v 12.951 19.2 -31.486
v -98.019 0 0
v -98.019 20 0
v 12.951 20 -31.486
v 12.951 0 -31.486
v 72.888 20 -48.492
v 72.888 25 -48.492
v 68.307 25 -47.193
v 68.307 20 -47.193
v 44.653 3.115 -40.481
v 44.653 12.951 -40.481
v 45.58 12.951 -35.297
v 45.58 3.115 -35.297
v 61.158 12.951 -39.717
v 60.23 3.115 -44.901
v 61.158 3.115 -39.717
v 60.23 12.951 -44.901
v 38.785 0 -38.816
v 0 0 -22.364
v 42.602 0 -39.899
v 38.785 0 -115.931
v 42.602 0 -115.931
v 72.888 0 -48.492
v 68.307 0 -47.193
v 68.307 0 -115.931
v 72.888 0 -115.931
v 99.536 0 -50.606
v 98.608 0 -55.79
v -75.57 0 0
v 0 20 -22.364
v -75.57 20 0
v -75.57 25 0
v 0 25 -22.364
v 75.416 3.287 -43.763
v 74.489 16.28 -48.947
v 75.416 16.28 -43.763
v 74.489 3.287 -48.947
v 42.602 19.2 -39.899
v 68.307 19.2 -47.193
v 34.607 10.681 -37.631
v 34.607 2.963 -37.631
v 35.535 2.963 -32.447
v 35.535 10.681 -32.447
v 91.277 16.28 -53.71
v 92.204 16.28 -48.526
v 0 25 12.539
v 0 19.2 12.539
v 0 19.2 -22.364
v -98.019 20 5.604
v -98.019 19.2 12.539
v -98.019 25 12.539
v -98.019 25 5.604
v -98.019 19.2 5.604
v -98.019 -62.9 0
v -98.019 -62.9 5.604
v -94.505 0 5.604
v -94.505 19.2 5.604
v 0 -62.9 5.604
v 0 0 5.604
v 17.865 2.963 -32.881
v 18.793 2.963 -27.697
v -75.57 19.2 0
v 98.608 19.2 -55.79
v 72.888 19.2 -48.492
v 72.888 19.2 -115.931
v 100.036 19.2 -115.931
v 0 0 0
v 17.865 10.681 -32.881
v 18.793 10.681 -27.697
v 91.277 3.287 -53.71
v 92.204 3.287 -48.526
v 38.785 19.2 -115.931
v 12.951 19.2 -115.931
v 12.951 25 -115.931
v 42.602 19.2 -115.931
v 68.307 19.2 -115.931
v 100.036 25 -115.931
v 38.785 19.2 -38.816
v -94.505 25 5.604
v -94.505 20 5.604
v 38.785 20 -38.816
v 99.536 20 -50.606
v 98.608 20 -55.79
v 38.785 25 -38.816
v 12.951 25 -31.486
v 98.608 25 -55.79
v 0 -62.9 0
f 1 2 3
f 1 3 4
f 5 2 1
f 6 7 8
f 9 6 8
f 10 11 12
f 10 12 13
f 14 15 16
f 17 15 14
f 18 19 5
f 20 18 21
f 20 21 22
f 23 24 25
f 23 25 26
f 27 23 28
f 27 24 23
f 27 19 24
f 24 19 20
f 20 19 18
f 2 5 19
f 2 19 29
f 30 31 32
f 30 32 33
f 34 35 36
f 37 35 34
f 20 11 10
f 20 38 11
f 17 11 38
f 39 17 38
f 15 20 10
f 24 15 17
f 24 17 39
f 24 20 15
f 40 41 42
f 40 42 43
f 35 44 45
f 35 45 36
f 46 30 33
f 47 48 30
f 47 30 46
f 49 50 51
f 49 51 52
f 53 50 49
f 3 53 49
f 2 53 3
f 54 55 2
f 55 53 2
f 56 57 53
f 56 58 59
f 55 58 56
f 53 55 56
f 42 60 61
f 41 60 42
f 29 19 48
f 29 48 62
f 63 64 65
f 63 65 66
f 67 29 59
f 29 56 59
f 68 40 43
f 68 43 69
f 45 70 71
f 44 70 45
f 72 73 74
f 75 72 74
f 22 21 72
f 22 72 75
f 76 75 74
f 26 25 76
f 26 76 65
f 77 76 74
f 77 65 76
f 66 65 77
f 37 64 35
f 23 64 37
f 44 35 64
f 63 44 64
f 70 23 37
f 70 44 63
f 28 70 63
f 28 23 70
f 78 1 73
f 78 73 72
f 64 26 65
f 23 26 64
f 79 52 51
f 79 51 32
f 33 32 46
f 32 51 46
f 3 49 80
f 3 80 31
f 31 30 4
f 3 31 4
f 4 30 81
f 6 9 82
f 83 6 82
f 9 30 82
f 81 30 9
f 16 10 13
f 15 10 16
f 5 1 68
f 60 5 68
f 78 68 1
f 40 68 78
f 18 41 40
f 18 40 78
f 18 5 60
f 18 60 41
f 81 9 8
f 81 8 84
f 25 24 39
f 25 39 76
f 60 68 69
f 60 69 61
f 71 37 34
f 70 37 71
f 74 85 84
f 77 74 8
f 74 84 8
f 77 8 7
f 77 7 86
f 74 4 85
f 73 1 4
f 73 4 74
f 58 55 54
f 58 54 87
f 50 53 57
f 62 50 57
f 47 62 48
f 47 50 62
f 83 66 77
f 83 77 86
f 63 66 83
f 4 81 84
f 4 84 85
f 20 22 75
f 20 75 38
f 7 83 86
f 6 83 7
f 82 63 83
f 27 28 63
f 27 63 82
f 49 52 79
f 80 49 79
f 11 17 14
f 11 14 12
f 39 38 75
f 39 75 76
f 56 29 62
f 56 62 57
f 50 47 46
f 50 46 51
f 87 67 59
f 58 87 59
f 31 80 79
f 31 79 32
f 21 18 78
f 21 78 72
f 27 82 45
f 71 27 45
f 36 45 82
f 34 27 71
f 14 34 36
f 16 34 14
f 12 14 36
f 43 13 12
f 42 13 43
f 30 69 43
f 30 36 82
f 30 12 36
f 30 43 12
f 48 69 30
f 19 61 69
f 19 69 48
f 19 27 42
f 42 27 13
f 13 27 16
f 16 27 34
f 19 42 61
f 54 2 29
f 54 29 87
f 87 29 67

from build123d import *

# Parameters (mm, degrees)
F1_DEPTH = 62.9
F2_DEPTH = 20
F3_START = -19.2
F3_DEPTH = 5.8
F4_W     = 17.40286313
F4_H     = 7.7177907806
F4_W_2   = 16.192227602
F4_H_2   = 9.8363999277
F4_W_3   = 17.4506753683
F4_H_3   = 12.9930109251


with BuildPart() as f1:
    # F0 (on Front) → F1 (new body)
    with BuildSketch(Plane.XZ):
        Polygon((-75.5699121067, 0), (0, 0), (0, 5.6038224138), (-94.5054218173, 5.6038224138), align=None)
        Polygon((-98.0191975832, 0), (-75.5699121067, 0), (-94.5054218173, 5.6038224138), (-98.0191975832, 5.6038224138), align=None)
    extrude(amount=F1_DEPTH)

    # F0 (on Front) → F2 (join)
    with BuildSketch(Plane.XZ):
        Polygon((0, -22.3643500358), (-75.5699121067, 0), (-98.0191975832, 0), (12.9512035679, -31.4862316811), (38.7845113873, -38.8160557302), (42.6020771265, -39.8992342902), (68.3070272207, -47.1926387081), (72.8881061077, -48.4924529801), (98.6080013494, -55.7900978655), (99.5356142521, -50.6061278284), align=None)
        Polygon((-98.0191975832, 0), (-75.5699121067, 0), (-94.5054218173, 5.6038224138), (-98.0191975832, 5.6038224138), align=None)
        Polygon((72.8881061077, -115.9313321114), (72.8881061077, -48.4924529801), (68.3070272207, -47.1926387081), (68.3070272207, -115.9313321114), align=None)
        Polygon((42.6020771265, -39.8992342902), (38.7845113873, -38.8160557302), (38.7845113873, -115.9313321114), (42.6020771265, -115.9313321114), align=None)
    extrude(amount=-F2_DEPTH)

    # F0 (on Front) → F3 (join)
    with BuildSketch(Plane.XZ.offset(F3_START)):
        Polygon((0, -22.3643500358), (0, 0), (-75.5699121067, 0), align=None)
        Polygon((-75.5699121067, 0), (0, 0), (0, 5.6038224138), (-94.5054218173, 5.6038224138), align=None)
        Polygon((-94.5054218173, 5.6038224138), (0, 5.6038224138), (0, 12.5394500792), (-98.0191975832, 12.5394500792), (-98.0191975832, 5.6038224138), align=None)
        Polygon((38.7845113873, -38.8160557302), (12.9512035679, -31.4862316811), (12.9512035679, -115.9313321114), (38.7845113873, -115.9313321114), align=None)
        Polygon((68.3070272207, -47.1926387081), (42.6020771265, -39.8992342902), (42.6020771265, -115.9313321114), (68.3070272207, -115.9313321114), align=None)
        Polygon((100.0360324979, -115.9313321114), (98.6080013494, -55.7900978655), (72.8881061077, -48.4924529801), (72.8881061077, -115.9313321114), align=None)
        Polygon((42.6020771265, -39.8992342902), (38.7845113873, -38.8160557302), (38.7845113873, -115.9313321114), (42.6020771265, -115.9313321114), align=None)
        Polygon((72.8881061077, -115.9313321114), (72.8881061077, -48.4924529801), (68.3070272207, -47.1926387081), (68.3070272207, -115.9313321114), align=None)
    extrude(amount=-F3_DEPTH)

    # F5: sweep along a path in F0
    with BuildLine(Plane.XZ) as f5_path:
        Line((99.5356142521, -50.6061278284), (98.6080013494, -55.7900978655))
    # F4 (on face) → F5 (sweep, cut)
    with BuildSketch(Plane(origin=(-5.872766279, 0, -20.6980383189), x_dir=(0.9620252097, 0, -0.2729606122), z_dir=(0.2729606122, 0, 0.9620252097))):
        with Locations((34.340926446, 6.8220865214)):
            Rectangle(F4_W, F4_H)
        with Locations((61.5801885724, 8.032720536)):
            Rectangle(F4_W_2, F4_H_2)
        with Locations((93.2230502367, 9.7836576169)):
            Rectangle(F4_W_3, F4_H_3)
    sweep(path=f5_path.line, mode=Mode.SUBTRACT)


solid = f1.part
